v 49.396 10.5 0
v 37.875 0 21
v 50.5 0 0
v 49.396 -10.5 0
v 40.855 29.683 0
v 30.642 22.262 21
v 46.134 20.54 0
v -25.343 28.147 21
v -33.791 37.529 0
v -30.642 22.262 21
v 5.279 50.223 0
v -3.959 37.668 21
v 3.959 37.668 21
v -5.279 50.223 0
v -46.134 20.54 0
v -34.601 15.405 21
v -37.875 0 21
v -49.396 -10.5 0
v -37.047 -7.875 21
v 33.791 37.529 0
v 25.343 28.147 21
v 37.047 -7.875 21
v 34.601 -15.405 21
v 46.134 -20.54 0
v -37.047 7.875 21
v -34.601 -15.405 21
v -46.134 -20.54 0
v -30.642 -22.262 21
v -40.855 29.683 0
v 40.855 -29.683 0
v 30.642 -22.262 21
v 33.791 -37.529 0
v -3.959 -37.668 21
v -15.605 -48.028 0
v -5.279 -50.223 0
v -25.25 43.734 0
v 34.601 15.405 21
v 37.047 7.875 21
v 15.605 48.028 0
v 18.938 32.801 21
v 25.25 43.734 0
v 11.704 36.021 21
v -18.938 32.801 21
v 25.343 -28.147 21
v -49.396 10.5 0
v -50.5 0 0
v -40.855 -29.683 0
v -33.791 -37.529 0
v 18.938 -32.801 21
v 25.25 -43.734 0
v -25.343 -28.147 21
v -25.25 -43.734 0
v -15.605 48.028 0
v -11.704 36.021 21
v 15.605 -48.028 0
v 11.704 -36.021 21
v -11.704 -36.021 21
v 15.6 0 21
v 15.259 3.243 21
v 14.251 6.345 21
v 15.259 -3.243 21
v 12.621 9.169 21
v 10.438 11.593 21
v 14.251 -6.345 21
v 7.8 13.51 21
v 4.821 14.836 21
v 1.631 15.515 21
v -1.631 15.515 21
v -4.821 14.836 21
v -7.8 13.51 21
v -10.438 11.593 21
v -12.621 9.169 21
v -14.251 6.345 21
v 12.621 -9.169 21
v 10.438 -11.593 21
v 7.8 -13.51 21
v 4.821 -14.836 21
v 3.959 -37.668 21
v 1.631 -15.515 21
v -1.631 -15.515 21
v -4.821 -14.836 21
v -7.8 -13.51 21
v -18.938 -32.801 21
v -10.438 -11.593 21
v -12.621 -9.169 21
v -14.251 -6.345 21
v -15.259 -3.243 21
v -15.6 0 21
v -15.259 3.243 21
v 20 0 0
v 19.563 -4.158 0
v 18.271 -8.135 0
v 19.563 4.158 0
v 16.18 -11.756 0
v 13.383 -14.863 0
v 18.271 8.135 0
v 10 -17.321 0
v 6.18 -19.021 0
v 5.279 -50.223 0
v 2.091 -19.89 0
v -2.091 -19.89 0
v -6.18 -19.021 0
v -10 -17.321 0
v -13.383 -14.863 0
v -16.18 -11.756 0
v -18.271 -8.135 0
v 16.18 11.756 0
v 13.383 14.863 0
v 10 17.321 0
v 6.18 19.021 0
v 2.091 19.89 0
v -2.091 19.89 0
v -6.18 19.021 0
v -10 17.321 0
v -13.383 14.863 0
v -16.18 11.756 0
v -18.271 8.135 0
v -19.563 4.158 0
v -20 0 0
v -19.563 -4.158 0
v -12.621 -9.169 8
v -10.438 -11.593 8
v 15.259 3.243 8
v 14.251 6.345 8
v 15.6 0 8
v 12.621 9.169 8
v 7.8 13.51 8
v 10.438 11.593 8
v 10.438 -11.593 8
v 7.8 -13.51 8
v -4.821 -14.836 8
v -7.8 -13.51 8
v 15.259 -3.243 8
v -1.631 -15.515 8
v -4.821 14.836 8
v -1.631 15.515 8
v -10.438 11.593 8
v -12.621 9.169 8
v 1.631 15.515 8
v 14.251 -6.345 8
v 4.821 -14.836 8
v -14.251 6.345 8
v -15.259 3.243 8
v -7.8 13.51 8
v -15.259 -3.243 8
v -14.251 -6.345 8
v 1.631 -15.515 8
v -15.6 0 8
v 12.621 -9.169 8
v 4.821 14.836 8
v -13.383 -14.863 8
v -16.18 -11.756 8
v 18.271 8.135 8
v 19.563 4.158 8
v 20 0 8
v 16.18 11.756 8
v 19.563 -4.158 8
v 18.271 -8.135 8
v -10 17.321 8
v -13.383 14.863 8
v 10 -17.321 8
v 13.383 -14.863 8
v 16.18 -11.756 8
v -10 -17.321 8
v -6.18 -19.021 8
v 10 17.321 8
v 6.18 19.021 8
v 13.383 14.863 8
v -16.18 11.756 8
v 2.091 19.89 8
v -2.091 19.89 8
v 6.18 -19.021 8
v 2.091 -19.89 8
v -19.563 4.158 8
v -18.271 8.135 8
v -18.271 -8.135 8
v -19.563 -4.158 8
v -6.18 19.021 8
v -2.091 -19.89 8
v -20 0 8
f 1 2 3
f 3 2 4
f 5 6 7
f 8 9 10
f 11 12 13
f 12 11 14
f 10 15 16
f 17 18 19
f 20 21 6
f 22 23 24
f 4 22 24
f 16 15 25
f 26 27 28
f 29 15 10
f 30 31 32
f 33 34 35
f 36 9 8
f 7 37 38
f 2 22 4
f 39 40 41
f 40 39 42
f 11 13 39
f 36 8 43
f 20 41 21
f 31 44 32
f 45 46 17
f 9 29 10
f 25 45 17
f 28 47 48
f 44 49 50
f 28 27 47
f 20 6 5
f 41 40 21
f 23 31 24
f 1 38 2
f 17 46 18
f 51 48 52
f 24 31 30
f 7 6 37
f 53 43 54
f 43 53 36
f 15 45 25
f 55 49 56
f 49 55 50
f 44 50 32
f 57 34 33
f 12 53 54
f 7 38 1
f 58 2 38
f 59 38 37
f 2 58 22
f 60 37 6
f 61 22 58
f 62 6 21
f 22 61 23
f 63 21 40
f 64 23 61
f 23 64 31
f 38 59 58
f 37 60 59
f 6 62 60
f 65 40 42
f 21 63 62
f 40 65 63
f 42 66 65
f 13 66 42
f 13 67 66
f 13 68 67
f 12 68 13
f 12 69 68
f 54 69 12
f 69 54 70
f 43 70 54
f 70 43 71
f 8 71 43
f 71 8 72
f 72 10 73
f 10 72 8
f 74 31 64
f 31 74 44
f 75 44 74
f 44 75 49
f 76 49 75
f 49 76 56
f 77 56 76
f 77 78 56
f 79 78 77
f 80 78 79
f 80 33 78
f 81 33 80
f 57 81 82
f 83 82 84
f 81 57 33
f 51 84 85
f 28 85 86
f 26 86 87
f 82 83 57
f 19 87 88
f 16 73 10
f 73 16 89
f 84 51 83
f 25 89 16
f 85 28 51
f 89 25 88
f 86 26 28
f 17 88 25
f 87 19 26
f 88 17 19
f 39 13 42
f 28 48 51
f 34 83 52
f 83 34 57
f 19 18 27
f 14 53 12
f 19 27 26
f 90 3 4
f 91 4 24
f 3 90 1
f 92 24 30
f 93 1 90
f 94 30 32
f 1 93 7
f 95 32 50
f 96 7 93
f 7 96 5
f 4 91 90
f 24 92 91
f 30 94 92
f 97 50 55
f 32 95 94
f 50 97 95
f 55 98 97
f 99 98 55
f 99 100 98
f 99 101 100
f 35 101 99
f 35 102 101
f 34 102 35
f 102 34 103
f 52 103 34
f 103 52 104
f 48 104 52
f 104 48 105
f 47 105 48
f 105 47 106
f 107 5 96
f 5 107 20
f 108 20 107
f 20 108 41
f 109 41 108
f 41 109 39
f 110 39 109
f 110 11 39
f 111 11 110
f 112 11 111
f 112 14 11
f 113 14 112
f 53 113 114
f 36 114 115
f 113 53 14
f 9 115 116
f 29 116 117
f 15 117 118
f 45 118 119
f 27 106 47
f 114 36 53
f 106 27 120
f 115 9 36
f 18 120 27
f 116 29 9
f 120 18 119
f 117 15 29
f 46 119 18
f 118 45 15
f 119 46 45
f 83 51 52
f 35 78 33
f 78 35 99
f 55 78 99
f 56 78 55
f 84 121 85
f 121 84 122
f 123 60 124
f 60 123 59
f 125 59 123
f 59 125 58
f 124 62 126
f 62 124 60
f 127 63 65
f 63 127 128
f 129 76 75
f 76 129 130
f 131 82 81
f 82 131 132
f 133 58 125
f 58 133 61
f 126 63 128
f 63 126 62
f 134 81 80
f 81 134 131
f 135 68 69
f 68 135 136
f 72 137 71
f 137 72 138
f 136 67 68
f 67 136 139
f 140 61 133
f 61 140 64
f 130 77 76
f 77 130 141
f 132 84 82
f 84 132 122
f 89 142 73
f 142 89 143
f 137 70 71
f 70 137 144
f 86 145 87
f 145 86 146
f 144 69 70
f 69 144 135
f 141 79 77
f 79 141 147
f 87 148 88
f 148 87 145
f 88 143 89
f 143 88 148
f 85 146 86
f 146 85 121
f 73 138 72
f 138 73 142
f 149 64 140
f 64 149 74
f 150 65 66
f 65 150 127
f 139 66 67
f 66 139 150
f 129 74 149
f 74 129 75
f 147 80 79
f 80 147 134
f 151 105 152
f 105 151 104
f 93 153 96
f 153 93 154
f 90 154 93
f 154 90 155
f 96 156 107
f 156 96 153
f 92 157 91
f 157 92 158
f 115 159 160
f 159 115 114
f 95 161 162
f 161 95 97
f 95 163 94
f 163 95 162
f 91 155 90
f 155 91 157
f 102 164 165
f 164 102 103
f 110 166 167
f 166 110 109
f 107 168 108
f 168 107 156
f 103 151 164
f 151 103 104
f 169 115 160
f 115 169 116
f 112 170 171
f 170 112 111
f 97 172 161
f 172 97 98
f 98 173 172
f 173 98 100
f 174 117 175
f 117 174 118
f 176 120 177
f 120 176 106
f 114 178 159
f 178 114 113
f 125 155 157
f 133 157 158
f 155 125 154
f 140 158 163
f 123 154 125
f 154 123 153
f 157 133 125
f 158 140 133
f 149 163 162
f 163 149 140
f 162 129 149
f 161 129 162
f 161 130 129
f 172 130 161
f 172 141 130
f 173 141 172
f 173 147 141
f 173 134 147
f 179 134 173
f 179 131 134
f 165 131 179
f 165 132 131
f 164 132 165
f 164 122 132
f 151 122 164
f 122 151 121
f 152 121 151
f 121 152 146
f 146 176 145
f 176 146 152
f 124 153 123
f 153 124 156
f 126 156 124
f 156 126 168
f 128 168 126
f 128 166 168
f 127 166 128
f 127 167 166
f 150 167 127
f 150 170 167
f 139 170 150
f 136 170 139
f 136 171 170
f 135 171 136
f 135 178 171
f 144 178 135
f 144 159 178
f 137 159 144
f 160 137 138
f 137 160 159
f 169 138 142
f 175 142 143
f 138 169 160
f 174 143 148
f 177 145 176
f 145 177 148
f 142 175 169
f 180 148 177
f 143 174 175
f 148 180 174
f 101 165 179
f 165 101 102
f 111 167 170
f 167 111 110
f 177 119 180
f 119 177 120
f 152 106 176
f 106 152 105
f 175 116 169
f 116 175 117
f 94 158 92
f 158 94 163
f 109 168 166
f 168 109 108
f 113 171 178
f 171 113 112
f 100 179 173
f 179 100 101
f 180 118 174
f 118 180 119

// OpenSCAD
height=21;
radius=50.5;

module hole()
{
	cylinder((height+2),(15.6),(15.6));
}

module counterbore()
{
		cylinder((9),(20),(20));
}

difference()
{
	cylinder((height),(radius),(radius*.75), 0);
	hole();
	translate([0,0,-1])
	{
	counterbore();
	}
}
